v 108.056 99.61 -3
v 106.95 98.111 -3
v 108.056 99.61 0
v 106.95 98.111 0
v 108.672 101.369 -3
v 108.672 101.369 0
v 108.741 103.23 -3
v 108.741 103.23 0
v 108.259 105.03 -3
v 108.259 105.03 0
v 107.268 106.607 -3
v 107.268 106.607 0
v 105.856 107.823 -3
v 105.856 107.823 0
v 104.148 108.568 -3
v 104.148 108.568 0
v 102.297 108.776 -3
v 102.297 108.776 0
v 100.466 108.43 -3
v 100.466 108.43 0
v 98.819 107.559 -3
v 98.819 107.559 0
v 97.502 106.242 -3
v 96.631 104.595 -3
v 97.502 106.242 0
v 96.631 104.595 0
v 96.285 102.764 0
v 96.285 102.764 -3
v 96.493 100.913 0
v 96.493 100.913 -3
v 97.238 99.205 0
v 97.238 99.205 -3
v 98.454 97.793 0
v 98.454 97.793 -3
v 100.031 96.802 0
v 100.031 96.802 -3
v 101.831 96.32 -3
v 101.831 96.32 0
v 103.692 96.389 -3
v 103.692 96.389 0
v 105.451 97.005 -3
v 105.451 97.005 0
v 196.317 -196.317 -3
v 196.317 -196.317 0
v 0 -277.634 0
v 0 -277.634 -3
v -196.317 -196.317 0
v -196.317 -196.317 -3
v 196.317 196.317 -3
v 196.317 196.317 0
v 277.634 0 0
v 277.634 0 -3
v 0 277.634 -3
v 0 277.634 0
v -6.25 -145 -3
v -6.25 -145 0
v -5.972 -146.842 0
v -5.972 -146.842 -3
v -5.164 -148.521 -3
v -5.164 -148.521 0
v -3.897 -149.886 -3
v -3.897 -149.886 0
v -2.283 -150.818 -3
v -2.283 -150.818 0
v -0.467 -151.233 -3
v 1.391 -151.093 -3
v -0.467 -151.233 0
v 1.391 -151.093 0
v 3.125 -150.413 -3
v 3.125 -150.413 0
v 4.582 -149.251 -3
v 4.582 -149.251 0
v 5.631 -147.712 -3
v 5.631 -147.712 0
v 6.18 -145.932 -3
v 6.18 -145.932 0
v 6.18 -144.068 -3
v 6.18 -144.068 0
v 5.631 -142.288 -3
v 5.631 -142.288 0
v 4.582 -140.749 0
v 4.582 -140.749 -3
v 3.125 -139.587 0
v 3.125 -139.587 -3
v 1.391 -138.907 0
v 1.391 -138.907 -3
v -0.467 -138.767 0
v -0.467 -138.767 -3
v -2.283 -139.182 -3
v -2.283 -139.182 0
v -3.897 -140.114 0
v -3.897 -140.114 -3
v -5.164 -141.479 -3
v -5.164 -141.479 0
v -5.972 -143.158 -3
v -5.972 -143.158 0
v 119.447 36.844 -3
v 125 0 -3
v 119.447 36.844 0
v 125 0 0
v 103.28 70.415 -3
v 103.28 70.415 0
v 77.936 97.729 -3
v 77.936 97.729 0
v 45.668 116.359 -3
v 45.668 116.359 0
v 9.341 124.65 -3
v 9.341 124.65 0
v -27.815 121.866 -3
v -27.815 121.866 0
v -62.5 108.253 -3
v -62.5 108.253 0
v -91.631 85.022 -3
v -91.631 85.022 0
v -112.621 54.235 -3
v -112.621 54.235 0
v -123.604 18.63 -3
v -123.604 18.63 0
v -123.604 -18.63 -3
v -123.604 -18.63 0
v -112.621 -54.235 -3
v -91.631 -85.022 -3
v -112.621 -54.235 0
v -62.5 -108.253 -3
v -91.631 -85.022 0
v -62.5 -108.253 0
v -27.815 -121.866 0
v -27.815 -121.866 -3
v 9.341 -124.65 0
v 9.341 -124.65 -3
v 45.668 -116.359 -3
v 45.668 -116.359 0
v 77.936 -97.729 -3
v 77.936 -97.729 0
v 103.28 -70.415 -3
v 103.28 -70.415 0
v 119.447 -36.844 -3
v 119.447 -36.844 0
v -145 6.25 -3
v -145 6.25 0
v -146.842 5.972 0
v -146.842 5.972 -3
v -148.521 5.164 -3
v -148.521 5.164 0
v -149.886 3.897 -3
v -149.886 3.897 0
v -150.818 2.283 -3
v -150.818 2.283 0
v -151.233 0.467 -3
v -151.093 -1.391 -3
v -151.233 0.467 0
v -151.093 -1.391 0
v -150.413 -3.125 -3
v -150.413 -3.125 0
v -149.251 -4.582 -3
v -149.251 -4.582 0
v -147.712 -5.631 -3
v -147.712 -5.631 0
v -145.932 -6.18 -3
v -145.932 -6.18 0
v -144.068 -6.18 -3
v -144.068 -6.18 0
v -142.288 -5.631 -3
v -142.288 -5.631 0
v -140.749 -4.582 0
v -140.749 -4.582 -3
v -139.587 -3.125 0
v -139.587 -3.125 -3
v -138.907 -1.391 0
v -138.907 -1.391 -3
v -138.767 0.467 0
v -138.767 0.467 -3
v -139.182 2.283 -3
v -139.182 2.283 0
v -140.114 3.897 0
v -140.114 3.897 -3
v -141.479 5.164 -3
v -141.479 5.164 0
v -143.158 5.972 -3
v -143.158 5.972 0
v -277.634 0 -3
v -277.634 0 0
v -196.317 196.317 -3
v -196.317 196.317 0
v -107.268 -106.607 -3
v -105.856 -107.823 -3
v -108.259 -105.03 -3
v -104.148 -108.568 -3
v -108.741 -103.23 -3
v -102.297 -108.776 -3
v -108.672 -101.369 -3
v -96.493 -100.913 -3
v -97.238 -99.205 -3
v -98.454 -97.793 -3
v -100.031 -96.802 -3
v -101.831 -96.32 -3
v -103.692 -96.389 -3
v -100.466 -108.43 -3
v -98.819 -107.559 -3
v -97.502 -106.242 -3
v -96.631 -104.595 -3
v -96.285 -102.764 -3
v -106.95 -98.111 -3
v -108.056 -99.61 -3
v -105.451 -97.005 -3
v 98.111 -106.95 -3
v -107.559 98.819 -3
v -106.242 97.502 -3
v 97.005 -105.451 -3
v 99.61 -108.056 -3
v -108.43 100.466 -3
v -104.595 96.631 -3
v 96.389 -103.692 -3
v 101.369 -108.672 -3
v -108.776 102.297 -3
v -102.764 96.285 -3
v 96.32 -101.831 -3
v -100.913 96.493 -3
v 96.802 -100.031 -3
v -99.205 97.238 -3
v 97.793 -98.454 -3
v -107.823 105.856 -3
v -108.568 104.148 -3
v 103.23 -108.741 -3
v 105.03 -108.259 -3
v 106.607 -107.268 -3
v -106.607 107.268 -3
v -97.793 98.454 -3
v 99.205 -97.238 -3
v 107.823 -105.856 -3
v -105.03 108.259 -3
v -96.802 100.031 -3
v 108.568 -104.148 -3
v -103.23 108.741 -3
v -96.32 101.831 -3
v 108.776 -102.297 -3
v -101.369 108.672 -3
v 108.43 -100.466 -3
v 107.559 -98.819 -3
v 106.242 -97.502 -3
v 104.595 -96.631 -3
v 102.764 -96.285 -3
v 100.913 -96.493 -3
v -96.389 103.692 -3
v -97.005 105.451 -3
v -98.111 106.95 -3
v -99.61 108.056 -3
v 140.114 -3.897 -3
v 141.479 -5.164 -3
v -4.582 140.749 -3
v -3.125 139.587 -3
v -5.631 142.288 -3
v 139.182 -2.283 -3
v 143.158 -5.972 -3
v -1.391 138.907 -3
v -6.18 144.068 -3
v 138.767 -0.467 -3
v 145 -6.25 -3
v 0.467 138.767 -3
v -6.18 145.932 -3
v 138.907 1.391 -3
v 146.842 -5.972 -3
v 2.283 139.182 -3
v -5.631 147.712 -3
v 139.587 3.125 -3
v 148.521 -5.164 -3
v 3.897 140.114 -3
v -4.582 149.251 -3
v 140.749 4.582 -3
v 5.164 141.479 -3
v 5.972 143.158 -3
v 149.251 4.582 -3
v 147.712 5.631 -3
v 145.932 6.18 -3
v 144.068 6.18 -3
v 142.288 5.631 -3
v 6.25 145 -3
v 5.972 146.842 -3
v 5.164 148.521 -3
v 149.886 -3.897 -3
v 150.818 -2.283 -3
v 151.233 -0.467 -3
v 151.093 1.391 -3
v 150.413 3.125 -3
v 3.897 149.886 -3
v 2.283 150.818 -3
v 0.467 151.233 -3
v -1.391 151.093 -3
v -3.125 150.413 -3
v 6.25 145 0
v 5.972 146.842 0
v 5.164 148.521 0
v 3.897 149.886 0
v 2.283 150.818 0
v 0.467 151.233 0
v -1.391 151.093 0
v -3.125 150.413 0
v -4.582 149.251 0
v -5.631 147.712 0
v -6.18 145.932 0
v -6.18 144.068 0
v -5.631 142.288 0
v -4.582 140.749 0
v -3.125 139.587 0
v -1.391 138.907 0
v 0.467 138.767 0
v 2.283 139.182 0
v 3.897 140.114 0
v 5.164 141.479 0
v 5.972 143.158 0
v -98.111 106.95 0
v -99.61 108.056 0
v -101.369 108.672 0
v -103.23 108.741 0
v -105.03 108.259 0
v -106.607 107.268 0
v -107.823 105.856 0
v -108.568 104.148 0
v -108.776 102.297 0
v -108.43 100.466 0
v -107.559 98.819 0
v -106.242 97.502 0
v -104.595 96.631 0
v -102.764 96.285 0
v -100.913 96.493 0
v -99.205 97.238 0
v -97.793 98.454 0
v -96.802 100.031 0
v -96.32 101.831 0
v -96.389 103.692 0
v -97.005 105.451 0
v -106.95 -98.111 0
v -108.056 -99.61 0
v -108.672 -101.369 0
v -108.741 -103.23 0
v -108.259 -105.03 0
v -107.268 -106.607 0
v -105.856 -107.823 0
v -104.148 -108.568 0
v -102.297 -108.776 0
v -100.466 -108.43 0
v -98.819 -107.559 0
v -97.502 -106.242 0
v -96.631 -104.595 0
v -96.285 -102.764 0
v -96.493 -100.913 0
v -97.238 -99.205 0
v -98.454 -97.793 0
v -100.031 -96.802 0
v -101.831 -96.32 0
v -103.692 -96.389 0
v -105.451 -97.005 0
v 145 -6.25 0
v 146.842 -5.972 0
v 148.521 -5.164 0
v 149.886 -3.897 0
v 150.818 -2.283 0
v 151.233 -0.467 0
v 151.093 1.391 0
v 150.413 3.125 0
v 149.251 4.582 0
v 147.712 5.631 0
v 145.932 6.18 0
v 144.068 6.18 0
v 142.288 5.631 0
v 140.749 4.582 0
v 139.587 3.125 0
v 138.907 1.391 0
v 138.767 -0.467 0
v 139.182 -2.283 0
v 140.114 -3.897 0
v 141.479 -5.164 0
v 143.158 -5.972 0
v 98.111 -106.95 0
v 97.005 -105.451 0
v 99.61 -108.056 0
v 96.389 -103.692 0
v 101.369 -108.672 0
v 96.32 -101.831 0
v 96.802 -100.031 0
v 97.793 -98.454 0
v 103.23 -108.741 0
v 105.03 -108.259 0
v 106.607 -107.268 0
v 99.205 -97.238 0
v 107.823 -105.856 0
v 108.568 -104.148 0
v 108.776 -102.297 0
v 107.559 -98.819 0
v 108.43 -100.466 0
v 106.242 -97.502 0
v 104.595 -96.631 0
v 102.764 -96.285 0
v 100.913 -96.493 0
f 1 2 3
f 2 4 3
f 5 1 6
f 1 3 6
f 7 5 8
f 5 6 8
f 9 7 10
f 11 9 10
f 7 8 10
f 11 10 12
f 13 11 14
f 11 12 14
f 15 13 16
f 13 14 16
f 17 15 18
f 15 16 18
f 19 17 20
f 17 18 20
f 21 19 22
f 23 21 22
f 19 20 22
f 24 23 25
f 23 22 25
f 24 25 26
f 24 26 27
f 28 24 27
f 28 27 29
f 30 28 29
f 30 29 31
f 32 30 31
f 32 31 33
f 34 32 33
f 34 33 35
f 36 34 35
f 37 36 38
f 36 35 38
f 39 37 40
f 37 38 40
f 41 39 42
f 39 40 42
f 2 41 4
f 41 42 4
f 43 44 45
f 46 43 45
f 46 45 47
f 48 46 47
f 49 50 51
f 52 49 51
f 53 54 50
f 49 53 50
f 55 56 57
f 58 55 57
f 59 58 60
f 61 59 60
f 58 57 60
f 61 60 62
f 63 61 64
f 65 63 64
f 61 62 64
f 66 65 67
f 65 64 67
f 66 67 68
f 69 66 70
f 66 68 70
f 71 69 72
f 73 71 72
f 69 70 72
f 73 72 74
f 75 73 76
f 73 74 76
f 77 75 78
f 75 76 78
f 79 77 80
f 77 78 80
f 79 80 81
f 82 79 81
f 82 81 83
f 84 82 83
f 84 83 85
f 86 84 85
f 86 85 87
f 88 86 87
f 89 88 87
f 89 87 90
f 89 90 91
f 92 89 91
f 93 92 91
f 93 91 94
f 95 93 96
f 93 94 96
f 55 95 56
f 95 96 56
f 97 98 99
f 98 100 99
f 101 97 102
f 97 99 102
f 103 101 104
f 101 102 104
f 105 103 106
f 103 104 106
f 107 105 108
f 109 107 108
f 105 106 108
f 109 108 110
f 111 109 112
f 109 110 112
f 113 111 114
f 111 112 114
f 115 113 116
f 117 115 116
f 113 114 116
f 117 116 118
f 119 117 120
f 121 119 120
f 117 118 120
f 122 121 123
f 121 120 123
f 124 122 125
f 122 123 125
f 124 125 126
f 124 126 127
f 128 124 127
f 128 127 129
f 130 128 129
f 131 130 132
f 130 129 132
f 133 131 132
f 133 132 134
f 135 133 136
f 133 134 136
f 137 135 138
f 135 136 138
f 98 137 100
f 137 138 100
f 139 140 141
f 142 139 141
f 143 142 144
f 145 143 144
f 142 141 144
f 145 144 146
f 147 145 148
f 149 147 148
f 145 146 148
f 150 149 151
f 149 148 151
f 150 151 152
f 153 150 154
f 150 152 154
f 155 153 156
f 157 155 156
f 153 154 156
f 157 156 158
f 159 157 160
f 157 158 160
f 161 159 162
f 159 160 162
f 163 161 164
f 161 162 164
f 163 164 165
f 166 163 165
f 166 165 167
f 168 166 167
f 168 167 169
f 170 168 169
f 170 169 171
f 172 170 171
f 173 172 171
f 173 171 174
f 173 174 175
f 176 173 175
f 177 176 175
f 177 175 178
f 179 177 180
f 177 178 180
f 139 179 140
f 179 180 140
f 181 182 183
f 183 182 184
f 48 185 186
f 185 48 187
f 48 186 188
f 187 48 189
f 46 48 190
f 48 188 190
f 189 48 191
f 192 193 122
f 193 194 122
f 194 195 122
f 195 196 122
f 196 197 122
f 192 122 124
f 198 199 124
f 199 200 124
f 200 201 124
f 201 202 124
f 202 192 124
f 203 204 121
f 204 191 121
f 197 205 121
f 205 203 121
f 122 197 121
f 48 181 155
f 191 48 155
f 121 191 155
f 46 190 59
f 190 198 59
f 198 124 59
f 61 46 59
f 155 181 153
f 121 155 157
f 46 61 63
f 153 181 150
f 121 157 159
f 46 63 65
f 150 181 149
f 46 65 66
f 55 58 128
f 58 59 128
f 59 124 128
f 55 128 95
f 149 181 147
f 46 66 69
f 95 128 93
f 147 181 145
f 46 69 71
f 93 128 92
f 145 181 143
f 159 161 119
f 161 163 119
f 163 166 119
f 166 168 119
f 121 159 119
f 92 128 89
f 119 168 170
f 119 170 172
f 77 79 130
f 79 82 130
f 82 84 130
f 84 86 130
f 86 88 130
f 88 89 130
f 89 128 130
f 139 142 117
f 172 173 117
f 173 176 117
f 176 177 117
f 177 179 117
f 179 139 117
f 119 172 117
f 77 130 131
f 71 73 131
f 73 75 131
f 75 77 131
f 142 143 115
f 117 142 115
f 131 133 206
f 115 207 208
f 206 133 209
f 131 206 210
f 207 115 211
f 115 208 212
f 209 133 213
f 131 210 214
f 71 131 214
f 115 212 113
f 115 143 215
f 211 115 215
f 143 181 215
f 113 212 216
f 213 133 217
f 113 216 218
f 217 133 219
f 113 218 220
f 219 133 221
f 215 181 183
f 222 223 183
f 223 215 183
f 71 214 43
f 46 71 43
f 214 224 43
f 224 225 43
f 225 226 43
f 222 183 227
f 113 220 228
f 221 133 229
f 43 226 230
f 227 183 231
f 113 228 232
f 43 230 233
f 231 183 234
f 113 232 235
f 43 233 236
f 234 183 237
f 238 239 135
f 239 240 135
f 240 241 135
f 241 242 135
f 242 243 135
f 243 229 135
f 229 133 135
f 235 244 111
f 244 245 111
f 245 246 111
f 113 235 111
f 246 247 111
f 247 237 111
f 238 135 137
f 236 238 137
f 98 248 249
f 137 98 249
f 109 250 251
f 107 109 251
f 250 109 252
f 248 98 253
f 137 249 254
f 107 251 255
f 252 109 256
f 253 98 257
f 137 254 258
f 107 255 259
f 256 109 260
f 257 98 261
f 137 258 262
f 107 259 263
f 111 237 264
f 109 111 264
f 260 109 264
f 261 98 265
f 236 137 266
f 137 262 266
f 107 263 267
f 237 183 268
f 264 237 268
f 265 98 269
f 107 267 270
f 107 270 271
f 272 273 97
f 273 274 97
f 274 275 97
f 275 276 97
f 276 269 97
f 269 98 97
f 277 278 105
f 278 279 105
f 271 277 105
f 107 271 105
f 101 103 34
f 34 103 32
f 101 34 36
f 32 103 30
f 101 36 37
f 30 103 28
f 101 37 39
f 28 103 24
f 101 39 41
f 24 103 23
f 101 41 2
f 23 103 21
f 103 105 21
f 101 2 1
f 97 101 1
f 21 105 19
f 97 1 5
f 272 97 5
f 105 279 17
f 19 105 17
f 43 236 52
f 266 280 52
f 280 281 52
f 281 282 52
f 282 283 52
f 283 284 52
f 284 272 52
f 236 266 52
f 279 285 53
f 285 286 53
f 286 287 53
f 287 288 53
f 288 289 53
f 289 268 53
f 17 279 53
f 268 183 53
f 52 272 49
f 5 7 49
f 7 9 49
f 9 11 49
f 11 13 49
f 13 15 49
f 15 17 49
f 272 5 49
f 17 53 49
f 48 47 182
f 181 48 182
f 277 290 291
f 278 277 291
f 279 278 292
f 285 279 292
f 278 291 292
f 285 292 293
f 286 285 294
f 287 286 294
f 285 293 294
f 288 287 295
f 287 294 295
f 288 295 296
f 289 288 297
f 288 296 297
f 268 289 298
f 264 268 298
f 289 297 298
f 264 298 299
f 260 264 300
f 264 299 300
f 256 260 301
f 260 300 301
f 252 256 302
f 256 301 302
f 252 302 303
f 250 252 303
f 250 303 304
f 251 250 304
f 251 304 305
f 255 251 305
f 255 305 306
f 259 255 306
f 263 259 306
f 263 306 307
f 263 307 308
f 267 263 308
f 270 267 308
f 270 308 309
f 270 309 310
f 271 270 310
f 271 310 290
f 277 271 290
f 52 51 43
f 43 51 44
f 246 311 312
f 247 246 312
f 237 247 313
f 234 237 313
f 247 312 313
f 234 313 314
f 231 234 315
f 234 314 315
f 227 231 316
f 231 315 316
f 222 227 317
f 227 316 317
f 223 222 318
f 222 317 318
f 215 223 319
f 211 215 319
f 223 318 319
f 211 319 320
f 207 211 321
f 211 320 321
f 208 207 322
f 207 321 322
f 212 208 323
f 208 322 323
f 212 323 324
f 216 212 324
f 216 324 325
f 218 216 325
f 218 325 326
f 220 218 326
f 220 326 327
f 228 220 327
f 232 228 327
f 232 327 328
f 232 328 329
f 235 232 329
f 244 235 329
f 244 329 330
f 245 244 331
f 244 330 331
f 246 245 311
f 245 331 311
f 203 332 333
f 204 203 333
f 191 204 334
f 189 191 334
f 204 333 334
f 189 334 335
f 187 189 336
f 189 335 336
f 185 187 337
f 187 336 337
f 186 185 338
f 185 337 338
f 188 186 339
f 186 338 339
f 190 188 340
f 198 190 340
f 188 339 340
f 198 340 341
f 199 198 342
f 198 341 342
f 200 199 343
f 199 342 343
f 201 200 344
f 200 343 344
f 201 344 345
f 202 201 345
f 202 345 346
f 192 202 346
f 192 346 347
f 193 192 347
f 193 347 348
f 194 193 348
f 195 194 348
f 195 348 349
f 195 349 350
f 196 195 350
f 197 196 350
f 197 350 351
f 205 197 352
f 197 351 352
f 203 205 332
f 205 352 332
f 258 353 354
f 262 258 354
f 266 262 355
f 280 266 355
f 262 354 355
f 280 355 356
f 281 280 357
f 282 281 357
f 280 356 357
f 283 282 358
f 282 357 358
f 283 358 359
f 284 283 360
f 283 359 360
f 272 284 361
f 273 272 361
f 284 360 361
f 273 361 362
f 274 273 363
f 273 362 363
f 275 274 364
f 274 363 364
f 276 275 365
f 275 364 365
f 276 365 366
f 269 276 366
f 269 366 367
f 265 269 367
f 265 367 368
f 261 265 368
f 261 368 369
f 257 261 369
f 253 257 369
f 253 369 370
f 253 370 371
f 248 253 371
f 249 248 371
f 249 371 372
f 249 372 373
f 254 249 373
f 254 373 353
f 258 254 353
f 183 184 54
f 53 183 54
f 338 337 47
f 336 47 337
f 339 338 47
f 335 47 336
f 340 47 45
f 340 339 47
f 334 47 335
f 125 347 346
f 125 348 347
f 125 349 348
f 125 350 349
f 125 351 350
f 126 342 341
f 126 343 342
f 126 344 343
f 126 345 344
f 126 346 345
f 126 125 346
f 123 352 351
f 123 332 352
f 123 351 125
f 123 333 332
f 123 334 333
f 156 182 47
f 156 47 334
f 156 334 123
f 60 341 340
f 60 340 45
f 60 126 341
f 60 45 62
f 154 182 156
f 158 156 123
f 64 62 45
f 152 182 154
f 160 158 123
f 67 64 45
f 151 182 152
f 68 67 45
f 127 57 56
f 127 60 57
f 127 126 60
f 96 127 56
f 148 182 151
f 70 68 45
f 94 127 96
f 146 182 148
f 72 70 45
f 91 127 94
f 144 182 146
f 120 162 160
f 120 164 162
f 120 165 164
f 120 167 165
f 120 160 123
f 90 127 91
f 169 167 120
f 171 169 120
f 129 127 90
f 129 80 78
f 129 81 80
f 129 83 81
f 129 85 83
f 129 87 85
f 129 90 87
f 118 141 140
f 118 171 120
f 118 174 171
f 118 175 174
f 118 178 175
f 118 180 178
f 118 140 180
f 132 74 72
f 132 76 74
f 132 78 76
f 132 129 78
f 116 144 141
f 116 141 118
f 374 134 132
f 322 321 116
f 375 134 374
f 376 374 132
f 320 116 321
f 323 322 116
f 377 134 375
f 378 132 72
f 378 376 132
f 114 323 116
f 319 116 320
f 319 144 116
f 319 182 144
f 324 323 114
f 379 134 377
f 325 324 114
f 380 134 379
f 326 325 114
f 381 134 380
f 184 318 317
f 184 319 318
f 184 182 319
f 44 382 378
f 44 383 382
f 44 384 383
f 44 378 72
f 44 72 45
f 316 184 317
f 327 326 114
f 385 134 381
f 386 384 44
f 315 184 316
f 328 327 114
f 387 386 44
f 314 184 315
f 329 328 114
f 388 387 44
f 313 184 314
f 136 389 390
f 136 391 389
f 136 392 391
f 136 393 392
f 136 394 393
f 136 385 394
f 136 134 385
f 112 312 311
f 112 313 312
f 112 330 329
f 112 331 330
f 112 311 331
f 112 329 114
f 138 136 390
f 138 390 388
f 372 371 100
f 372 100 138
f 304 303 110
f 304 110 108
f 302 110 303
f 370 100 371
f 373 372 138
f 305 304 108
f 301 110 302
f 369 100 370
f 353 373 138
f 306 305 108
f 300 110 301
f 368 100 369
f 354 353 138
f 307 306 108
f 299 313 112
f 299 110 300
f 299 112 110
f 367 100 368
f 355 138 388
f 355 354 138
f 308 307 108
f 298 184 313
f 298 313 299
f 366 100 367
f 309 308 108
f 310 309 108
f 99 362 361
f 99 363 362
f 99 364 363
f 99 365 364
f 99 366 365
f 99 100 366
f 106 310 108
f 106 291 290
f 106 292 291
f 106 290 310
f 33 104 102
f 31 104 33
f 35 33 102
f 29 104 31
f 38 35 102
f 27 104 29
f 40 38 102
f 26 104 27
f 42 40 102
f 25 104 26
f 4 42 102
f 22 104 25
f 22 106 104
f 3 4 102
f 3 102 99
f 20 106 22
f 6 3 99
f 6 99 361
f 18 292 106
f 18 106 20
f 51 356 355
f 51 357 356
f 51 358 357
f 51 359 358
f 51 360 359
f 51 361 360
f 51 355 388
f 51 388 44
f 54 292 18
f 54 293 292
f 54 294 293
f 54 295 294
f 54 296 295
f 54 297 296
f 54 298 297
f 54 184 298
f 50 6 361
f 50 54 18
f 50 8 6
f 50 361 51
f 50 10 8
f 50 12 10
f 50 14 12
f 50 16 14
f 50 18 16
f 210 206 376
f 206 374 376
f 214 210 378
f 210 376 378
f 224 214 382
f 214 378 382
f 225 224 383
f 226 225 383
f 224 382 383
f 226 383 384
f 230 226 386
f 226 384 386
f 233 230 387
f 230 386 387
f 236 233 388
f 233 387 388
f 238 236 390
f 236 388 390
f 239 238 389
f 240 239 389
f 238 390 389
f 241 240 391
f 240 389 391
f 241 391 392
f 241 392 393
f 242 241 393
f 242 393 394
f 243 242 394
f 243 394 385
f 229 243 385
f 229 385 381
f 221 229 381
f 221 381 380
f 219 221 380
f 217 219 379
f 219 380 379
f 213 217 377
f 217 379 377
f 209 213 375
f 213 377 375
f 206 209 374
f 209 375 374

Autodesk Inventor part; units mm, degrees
ref_plane "YZ Plane" through (0, 0, 0) normal (1, 0, 0) x (0, 1, 0)
ref_plane "XZ Plane" through (0, 0, 0) normal (0, 1, 0) x (-1, 0, 0)
ref_plane "XY Plane" through (0, 0, 0) normal (0, 0, 1) x (1, 0, 0)
sketch "Sketch2" plane through (0, 0, 0) normal (0, 0, 1) x (1, 0, 0)
  line L0 (-196.3166, 196.3166) -> (0, 277.6336)
  line L1 (0, 277.6336) -> (196.3166, 196.3166)
  line L2 (196.3166, 196.3166) -> (277.6336, 0)
  line L3 (277.6336, 0) -> (196.3166, -196.3166)
  line L4 (196.3166, -196.3166) -> (0, -277.6336)
  line L5 (0, -277.6336) -> (-196.3166, -196.3166)
  line L6 (-196.3166, -196.3166) -> (-277.6336, 0)
  line L7 (-277.6336, 0) -> (-196.3166, 196.3166)
  circle A0 centre (0, 0) radius 125
  dimension "d23" = 513
  dimension "d26" = 250
extrude "Plate1" add sketch "Sketch2" against normal blind 3
sketch "Sketch4" plane through (0, 0, 0) normal (0, 0, 1) x (1, 0, 0)
  circle A0 centre (0, 145) radius 6.25
  circle A1 centre (0, 0) radius 125 projected
  dimension "d16" = 12.5
  dimension "d17" = 145
extrude "Extrusion1" cut sketch "Sketch4" against normal up to surface (3 mm away) contours A0
pattern_circular "Circular Pattern1" count 8 over 360 about axis through (0, 0, -10) along (0, 0, 1) of "Extrusion1"
equation "\"d23\" = Барабан_габарит_по_кассетам"
equation "\"d26\" = Вал_ось_диаметр_НОС"
equation "\"d15\" = Thickness"
equation "\"BendRadius\" = Thickness"
equation "\"BendReliefWidth\" = Thickness"
equation "\"BendReliefDepth\" = 0.5 * Thickness"
equation "\"CornerReliefSize\" = 4 * Thickness"
equation "\"MinimumRemnant\" = 2 * Thickness"
equation "\"TransitionRadius\" = BendRadius"
equation "\"JacobiRadiusSize\" = BendRadius"
equation "\"GapSize\" = Thickness"
equation "\"Барабан_габарит_по_кассетам\" = 513"
equation "\"Вал_ось_диаметр_НОС\" = 250"
equation "\"Thickness\" = 3"
properties part number "DMF 01 21 cylinder butt end nose"
